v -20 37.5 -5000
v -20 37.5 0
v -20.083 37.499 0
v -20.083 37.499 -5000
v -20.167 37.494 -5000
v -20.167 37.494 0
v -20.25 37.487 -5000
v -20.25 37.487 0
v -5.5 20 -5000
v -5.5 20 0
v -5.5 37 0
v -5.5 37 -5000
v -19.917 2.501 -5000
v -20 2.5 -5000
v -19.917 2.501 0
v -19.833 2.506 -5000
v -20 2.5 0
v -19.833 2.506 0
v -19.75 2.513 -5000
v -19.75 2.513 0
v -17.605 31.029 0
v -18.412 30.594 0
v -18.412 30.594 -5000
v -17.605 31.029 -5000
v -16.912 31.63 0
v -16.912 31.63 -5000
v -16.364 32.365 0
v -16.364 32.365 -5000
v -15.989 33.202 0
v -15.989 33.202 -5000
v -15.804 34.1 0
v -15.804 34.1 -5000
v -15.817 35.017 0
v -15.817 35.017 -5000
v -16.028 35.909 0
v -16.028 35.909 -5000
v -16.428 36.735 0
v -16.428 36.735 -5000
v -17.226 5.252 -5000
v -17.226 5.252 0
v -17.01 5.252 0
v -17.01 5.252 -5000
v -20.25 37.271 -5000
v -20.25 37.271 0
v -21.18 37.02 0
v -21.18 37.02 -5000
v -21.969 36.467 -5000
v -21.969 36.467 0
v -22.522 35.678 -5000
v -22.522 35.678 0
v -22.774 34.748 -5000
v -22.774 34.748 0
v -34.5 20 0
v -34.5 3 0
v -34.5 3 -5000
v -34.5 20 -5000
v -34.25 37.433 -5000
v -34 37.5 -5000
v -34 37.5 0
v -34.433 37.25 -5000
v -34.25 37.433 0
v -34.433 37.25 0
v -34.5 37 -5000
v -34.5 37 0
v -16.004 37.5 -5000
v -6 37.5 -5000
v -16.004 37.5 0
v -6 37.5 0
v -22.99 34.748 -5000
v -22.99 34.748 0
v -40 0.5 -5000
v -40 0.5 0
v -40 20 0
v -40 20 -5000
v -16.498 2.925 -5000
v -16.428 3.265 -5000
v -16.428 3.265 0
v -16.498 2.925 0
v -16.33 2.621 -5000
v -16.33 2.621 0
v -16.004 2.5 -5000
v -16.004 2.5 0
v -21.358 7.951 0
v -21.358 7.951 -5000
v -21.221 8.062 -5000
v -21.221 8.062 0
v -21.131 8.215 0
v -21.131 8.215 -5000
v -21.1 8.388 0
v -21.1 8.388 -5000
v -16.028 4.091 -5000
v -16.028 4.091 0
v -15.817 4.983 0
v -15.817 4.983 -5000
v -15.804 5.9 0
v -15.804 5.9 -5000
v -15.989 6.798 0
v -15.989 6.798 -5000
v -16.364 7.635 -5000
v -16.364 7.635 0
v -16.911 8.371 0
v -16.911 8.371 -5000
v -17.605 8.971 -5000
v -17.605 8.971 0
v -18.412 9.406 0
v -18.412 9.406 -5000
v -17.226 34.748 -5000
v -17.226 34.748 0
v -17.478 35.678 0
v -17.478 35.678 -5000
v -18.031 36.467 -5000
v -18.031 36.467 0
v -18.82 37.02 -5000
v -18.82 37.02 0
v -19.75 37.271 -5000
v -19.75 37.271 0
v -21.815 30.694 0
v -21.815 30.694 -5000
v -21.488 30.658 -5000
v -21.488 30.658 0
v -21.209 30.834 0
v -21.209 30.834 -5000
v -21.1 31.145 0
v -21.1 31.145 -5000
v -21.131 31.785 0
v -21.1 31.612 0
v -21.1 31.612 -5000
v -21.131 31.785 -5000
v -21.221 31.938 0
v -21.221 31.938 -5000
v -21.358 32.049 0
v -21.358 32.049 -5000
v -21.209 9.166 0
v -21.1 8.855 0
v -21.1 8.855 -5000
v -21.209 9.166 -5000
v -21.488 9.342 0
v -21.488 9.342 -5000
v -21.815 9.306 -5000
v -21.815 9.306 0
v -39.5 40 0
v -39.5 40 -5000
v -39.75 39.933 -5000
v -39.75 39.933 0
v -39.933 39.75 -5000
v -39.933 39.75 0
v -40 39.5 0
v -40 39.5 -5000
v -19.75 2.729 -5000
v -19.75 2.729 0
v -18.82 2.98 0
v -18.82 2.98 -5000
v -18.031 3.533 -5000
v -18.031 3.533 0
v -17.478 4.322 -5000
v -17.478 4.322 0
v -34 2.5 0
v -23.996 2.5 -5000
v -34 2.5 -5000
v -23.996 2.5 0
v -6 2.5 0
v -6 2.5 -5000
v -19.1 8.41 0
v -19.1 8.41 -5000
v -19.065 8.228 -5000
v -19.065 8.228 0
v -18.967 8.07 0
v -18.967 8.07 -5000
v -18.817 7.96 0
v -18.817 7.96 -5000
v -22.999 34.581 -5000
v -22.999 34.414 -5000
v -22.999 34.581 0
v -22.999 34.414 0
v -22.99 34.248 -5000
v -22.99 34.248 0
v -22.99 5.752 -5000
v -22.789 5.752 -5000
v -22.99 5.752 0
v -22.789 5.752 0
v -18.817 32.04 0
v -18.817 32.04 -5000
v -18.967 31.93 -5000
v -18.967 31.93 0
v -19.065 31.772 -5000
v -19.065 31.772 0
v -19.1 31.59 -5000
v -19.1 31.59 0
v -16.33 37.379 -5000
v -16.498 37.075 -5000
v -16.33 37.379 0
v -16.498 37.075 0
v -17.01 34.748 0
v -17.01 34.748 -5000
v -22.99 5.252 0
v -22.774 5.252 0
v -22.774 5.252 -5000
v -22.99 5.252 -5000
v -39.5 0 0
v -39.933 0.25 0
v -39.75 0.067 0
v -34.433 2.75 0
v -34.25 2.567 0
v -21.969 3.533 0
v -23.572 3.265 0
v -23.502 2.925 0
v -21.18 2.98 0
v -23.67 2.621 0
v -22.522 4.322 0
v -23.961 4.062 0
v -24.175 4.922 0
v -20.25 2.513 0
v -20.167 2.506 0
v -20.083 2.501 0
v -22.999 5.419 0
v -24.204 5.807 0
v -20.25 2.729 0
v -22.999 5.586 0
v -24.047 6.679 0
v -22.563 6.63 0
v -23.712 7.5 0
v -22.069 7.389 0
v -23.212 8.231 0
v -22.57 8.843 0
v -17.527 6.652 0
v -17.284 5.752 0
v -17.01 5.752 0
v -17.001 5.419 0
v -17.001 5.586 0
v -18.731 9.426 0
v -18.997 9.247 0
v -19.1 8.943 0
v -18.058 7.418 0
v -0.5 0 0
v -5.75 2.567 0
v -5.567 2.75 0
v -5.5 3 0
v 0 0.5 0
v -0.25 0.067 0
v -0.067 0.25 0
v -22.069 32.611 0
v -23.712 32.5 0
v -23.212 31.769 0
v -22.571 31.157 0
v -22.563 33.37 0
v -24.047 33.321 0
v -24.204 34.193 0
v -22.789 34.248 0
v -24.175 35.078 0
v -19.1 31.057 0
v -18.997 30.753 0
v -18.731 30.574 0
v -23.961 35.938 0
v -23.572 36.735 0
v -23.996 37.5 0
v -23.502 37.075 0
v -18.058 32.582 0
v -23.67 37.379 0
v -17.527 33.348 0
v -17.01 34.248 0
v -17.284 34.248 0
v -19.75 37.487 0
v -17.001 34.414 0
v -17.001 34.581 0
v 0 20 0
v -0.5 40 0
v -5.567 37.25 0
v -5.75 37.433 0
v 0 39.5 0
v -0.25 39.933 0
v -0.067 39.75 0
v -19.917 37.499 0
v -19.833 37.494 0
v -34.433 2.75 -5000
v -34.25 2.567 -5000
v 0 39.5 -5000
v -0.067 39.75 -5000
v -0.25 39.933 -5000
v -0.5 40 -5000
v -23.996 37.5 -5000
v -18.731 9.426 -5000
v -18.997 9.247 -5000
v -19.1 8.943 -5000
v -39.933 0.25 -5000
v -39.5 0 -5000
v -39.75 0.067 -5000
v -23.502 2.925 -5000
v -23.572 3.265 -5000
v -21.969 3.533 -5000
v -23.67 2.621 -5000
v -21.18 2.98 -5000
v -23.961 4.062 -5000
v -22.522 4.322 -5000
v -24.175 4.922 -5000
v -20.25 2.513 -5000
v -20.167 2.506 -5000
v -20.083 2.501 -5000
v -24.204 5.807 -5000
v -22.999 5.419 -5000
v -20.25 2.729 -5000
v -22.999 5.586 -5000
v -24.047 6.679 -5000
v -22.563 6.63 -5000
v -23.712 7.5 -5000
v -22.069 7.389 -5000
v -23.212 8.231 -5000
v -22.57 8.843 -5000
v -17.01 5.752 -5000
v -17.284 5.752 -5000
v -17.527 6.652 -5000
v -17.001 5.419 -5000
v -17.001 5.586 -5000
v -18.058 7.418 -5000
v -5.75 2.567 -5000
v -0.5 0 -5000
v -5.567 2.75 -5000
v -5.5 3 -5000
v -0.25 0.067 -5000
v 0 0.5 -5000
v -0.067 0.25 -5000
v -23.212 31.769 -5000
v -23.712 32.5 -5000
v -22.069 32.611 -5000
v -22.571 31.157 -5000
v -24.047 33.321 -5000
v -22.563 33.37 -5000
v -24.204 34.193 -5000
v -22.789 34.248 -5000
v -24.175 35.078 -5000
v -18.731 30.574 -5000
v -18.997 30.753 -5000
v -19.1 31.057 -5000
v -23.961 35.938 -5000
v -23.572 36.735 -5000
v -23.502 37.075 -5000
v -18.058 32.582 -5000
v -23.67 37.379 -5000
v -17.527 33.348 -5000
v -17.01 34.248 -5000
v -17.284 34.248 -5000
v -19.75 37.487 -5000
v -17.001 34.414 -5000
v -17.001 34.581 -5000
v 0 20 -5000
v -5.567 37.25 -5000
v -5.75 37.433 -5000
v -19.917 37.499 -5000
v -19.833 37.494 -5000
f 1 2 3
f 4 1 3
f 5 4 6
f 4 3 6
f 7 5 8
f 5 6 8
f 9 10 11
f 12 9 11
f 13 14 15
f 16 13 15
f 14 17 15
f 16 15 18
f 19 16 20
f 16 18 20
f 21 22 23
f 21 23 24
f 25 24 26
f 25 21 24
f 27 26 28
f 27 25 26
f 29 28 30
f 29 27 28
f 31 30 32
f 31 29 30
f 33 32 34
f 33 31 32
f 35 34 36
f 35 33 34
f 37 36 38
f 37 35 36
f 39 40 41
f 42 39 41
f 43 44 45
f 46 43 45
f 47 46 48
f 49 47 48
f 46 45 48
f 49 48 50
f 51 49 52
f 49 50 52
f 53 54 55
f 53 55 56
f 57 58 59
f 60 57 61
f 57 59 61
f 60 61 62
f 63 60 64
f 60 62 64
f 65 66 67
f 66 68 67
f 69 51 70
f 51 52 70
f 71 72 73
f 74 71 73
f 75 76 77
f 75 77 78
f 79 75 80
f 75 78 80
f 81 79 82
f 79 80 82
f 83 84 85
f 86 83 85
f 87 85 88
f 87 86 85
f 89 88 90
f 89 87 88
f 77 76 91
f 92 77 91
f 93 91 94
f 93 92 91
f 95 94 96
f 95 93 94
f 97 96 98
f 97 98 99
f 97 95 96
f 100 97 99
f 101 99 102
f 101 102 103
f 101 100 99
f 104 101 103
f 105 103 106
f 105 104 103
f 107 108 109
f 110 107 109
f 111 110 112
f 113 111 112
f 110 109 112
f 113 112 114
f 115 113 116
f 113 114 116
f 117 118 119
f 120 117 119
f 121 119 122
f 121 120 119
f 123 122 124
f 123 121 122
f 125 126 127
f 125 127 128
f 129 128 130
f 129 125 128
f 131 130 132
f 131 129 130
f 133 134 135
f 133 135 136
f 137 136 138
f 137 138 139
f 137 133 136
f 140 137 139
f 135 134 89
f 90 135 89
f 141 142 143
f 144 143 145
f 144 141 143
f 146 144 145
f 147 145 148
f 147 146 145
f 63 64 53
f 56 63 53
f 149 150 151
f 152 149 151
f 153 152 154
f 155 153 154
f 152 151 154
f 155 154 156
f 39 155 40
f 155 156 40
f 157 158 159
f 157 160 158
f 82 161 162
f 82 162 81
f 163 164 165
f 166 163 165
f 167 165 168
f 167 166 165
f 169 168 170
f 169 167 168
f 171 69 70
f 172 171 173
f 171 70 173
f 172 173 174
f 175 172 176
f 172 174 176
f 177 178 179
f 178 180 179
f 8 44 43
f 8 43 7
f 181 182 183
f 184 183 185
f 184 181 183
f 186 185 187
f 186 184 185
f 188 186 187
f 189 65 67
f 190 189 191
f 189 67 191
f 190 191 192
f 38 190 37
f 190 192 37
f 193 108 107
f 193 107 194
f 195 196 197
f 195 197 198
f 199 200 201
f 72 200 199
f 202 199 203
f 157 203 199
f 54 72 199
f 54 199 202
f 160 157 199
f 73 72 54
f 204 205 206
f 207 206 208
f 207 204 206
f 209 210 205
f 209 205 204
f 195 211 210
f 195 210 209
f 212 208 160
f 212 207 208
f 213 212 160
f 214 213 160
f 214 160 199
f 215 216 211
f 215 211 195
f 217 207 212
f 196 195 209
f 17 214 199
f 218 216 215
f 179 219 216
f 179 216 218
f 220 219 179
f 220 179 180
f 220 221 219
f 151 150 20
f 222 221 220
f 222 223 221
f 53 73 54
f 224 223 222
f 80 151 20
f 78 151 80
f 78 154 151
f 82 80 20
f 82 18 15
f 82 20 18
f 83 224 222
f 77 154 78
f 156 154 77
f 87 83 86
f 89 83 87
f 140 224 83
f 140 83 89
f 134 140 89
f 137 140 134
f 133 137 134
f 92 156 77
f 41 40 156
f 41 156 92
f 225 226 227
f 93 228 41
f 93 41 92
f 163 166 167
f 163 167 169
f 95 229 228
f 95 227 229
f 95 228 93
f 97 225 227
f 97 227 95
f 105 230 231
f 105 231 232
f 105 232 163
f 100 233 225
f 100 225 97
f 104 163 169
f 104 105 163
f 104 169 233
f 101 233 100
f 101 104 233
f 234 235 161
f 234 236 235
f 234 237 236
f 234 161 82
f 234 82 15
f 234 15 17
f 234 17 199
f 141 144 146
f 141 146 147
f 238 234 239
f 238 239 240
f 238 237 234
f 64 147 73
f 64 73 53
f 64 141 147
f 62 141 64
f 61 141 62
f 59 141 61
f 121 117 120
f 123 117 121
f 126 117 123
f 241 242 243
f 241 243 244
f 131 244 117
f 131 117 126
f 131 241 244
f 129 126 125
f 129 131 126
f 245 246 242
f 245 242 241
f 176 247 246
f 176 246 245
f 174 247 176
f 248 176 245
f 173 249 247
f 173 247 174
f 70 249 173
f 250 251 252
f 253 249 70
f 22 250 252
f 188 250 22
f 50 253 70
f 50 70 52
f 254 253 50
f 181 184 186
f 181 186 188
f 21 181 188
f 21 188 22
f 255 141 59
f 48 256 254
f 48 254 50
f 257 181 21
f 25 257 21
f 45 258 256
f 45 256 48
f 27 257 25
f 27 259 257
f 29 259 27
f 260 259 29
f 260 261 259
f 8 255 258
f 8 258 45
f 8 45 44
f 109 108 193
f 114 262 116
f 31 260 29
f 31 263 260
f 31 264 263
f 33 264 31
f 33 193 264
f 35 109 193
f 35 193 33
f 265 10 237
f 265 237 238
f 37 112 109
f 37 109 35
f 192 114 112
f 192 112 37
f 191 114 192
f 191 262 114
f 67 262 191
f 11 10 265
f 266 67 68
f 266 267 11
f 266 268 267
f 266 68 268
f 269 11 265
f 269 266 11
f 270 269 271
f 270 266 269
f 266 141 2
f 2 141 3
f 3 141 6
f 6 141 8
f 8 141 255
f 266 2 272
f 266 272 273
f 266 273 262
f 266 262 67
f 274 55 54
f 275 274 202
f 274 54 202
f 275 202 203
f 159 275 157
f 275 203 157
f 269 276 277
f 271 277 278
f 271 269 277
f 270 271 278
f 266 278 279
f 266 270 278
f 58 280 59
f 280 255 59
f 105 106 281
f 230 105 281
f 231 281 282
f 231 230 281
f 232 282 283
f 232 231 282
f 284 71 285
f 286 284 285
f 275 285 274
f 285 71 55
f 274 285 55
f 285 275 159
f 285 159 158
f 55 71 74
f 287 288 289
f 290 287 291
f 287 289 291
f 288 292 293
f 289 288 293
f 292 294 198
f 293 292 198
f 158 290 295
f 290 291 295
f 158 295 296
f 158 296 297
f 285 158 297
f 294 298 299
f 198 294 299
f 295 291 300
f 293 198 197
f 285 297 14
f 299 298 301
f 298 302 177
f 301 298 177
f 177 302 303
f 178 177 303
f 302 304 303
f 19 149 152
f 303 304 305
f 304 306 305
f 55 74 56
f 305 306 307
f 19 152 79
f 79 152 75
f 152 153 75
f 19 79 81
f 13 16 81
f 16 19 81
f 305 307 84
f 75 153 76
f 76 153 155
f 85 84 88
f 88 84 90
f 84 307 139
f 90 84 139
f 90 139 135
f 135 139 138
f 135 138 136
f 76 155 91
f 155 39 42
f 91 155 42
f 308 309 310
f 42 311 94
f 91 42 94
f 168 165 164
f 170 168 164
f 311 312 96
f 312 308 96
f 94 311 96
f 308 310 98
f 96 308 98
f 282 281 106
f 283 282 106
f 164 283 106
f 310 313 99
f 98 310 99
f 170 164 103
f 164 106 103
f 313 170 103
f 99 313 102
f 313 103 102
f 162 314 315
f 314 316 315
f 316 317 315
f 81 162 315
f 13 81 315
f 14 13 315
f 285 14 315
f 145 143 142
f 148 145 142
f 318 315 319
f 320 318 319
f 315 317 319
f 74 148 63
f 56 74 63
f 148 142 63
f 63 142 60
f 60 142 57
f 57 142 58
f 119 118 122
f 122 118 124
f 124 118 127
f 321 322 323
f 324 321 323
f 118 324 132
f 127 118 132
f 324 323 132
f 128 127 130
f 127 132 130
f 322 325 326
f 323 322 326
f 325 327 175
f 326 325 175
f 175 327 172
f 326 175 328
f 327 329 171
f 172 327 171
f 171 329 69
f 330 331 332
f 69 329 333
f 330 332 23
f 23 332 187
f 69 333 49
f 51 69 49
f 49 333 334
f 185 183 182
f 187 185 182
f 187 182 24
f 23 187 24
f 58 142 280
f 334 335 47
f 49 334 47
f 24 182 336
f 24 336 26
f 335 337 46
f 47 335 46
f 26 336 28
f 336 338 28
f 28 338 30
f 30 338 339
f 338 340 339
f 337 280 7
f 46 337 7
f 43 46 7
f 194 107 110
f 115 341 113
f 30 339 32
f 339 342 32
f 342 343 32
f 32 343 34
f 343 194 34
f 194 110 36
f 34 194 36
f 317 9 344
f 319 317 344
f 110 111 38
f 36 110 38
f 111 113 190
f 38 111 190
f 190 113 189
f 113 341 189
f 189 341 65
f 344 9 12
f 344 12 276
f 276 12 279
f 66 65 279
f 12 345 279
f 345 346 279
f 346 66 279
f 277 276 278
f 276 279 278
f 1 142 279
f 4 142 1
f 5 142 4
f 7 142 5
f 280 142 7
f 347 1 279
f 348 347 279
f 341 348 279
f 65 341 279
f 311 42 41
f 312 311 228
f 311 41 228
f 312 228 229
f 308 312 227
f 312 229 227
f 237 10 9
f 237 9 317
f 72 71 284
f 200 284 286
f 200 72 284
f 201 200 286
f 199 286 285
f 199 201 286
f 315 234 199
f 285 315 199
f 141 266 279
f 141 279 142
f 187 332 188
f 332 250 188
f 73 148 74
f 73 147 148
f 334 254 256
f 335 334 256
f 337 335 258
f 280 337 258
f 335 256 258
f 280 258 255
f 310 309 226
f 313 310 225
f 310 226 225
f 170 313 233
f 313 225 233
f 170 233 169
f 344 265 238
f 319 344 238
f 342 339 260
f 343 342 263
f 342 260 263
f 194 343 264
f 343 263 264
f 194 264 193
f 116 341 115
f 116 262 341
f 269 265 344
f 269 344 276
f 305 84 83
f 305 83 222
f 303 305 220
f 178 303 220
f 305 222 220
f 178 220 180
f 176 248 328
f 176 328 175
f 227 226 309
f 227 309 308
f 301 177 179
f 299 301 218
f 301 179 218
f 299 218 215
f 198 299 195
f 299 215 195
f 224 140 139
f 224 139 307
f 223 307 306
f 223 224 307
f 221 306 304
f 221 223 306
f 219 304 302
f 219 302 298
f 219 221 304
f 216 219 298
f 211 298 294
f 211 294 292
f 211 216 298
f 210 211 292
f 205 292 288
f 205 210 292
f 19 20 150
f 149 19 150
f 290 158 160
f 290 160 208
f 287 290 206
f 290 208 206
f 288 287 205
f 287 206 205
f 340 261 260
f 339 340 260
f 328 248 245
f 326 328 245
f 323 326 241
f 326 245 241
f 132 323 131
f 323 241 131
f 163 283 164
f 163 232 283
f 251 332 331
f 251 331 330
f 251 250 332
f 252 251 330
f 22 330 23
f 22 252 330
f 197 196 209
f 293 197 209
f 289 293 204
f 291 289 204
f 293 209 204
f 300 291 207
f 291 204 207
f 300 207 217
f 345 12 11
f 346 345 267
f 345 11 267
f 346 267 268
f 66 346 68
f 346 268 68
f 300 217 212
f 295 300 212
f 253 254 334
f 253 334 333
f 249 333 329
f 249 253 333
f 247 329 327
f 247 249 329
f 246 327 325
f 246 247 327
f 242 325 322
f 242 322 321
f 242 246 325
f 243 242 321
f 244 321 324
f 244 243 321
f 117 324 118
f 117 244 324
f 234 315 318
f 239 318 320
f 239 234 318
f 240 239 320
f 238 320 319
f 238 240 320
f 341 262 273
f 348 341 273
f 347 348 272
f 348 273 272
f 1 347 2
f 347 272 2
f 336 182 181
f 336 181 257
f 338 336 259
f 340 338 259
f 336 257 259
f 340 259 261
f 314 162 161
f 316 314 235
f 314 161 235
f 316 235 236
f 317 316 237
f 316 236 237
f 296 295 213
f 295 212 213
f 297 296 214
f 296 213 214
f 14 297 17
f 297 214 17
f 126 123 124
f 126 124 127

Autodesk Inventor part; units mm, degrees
ref_plane "YZ Plane" through (0, 0, 0) normal (1, 0, 0) x (0, 1, 0)
ref_plane "XZ Plane" through (0, 0, 0) normal (0, 1, 0) x (-1, 0, 0)
ref_plane "XY Plane" through (0, 0, 0) normal (0, 0, 1) x (1, 0, 0)
sketch "Sketch1" plane through (0, 0, 0) normal (0, 0, 1) x (1, 0, 0)
  line L0 (0, 20) -> (0, 0.5)
  line L1 (-0.5, 0) -> (-39.5, 0)
  line L2 (-40, 0.5) -> (-40, 20)
  line L3 (-5.5, 20) -> (-5.5, 3)
  line L4 (-34.5, 3) -> (-34.5, 20)
  line L5 (3.5733, 20) -> (-48.8643, 20) construction
  line L6 (-19.1, 8.9433) -> (-19.1, 8.4104)
  line L7 (-21.1, 8.855) -> (-21.1, 8.3883)
  circle A0 centre (-20, 5.5022) radius 3 construction
  line L8 (-23.3299, 5.7522) -> (-16.6139, 5.7522) construction
  line L9 (-16.6139, 5.7522) -> (-16.6139, 5.2522) construction
  line L10 (-16.6139, 5.2522) -> (-23.3299, 5.2522) construction
  line L11 (-23.3299, 5.2522) -> (-23.3299, 5.7522) construction
  line L12 (-22.7888, 5.7522) -> (-22.9896, 5.7522)
  line L13 (-22.7735, 5.2522) -> (-22.9896, 5.2522)
  arc A1 (-22.9896, 5.7522) -> (-22.9896, 5.2522) centre (-20, 5.5022) ccw
  line L14 (-17.2838, 5.7522) -> (-17.0104, 5.7522)
  line L15 (-17.2265, 5.2522) -> (-17.0104, 5.2522)
  arc A2 (-17.0104, 5.2522) -> (-17.0104, 5.7522) centre (-20, 5.5022) ccw
  arc A3 (-17.2838, 5.7522) -> (-18.8169, 7.9599) centre (-20, 5.5022) ccw
  arc A4 (-21.3576, 7.951) -> (-22.7888, 5.7522) centre (-20, 5.5022) ccw
  arc A5 (-22.7735, 5.2522) -> (-17.2265, 5.2522) centre (-20, 5.5022) ccw
  line L16 (-20.25, 6.2494) -> (-19.75, 6.2494) construction
  line L17 (-19.75, 6.2494) -> (-19.75, 2.1596) construction
  line L18 (-19.75, 2.1596) -> (-20.25, 2.1596) construction
  line L19 (-20.25, 2.1596) -> (-20.25, 6.2494) construction
  line L20 (-20.25, 2.7287) -> (-20.25, 2.5126)
  line L21 (-19.75, 2.5126) -> (-19.75, 2.7287)
  arc A6 (-20.25, 2.5126) -> (-19.75, 2.5126) centre (-20, 4.9859) ccw
  arc A7 (-21.8153, 9.3062) -> (-23.5725, 3.2653) centre (-20, 5.5022) ccw
  arc A8 (-16.4275, 3.2653) -> (-18.4116, 9.4064) centre (-20, 5.5022) ccw
  line L22 (-6, 2.5) -> (-16.0037, 2.5)
  line L23 (-19.75, 2.5) -> (-20.25, 2.5)
  line L24 (-23.9963, 2.5) -> (-34, 2.5)
  circle A9 centre (-20, 5.5022) radius 4.215 construction
  arc A10 (-34.5, 3) -> (-34, 2.5) centre (-34, 3) ccw
  arc A11 (-40, 0.5) -> (-39.5, 0) centre (-39.5, 0.5) ccw
  arc A12 (-23.9963, 2.5) -> (-23.5725, 3.2653) centre (-23.9963, 3) ccw
  arc A13 (-21.1, 8.855) -> (-21.8153, 9.3062) centre (-21.6, 8.855) ccw
  arc A14 (-21.3576, 7.951) -> (-21.1, 8.3883) centre (-21.6, 8.3883) ccw
  arc A15 (-19.1, 8.4104) -> (-18.8169, 7.9599) centre (-18.6, 8.4104) ccw
  arc A16 (-18.4116, 9.4064) -> (-19.1, 8.9433) centre (-18.6, 8.9433) ccw
  arc A17 (-16.4275, 3.2653) -> (-16.0037, 2.5) centre (-16.0037, 3) ccw
  arc A18 (-6, 2.5) -> (-5.5, 3) centre (-6, 3) ccw
  arc A19 (-0.5, 0) -> (0, 0.5) centre (-0.5, 0.5) ccw
  line L25 (0, 20) -> (0, 39.5)
  line L26 (-0.5, 40) -> (-39.5, 40)
  line L27 (-40, 39.5) -> (-40, 20)
  line L28 (-5.5, 20) -> (-5.5, 37)
  line L29 (-34.5, 37) -> (-34.5, 20)
  line L30 (-19.1, 31.0567) -> (-19.1, 31.5896)
  line L31 (-21.1, 31.145) -> (-21.1, 31.6117)
  circle A20 centre (-20, 34.4978) radius 3 construction
  line L32 (-23.3299, 34.2478) -> (-16.6139, 34.2478) construction
  line L33 (-16.6139, 34.2478) -> (-16.6139, 34.7478) construction
  line L34 (-16.6139, 34.7478) -> (-23.3299, 34.7478) construction
  line L35 (-23.3299, 34.7478) -> (-23.3299, 34.2478) construction
  line L36 (-22.7888, 34.2478) -> (-22.9896, 34.2478)
  line L37 (-22.7735, 34.7478) -> (-22.9896, 34.7478)
  arc A21 (-22.9896, 34.7478) -> (-22.9896, 34.2478) centre (-20, 34.4978) ccw
  line L38 (-17.2838, 34.2478) -> (-17.0104, 34.2478)
  line L39 (-17.2265, 34.7478) -> (-17.0104, 34.7478)
  arc A22 (-17.0104, 34.2478) -> (-17.0104, 34.7478) centre (-20, 34.4978) ccw
  arc A23 (-18.8169, 32.0401) -> (-17.2838, 34.2478) centre (-20, 34.4978) ccw
  arc A24 (-22.7888, 34.2478) -> (-21.3576, 32.049) centre (-20, 34.4978) ccw
  arc A25 (-17.2265, 34.7478) -> (-22.7735, 34.7478) centre (-20, 34.4978) ccw
  line L40 (-20.25, 33.7506) -> (-19.75, 33.7506) construction
  line L41 (-19.75, 33.7506) -> (-19.75, 37.8404) construction
  line L42 (-19.75, 37.8404) -> (-20.25, 37.8404) construction
  line L43 (-20.25, 37.8404) -> (-20.25, 33.7506) construction
  line L44 (-20.25, 37.2713) -> (-20.25, 37.4874)
  line L45 (-19.75, 37.4874) -> (-19.75, 37.2713)
  arc A26 (-19.75, 37.4874) -> (-20.25, 37.4874) centre (-20, 35.0141) ccw
  arc A27 (-23.5725, 36.7347) -> (-21.8153, 30.6938) centre (-20, 34.4978) ccw
  arc A28 (-18.4116, 30.5936) -> (-16.4275, 36.7347) centre (-20, 34.4978) ccw
  line L46 (-6, 37.5) -> (-16.0037, 37.5)
  line L47 (-19.75, 37.5) -> (-20.25, 37.5)
  line L48 (-23.9963, 37.5) -> (-34, 37.5)
  circle A29 centre (-20, 34.4978) radius 4.215 construction
  arc A30 (-34, 37.5) -> (-34.5, 37) centre (-34, 37) ccw
  arc A31 (-39.5, 40) -> (-40, 39.5) centre (-39.5, 39.5) ccw
  arc A32 (-23.5725, 36.7347) -> (-23.9963, 37.5) centre (-23.9963, 37) ccw
  arc A33 (-21.8153, 30.6938) -> (-21.1, 31.145) centre (-21.6, 31.145) ccw
  arc A34 (-21.1, 31.6117) -> (-21.3576, 32.049) centre (-21.6, 31.6117) ccw
  arc A35 (-18.8169, 32.0401) -> (-19.1, 31.5896) centre (-18.6, 31.5896) ccw
  arc A36 (-19.1, 31.0567) -> (-18.4116, 30.5936) centre (-18.6, 31.0567) ccw
  arc A37 (-16.0037, 37.5) -> (-16.4275, 36.7347) centre (-16.0037, 37) ccw
  arc A38 (-5.5, 37) -> (-6, 37.5) centre (-6, 37) ccw
  arc A39 (0, 39.5) -> (-0.5, 40) centre (-0.5, 39.5) ccw
  point P0 (0, 0)
  point P1 (0, 0)
  point P2 (-40, 0)
  point P3 (-19.1, 9.62)
  point P4 (-19.1, 8.077)
  point P5 (-21.1, 9.5711)
  point P6 (-21.1, 8.077)
  point P7 (-22.9586, 2.5)
  point P8 (-17.0414, 2.5)
  point P9 (-17.1471, 5.7522)
  point P10 (-17.1185, 5.2522)
  point P11 (0, 40)
  point P12 (-40, 40)
  point P13 (-19.1, 30.38)
  point P14 (-19.1, 31.923)
  point P15 (-21.1, 30.4289)
  point P16 (-21.1, 31.923)
  point P17 (-22.9586, 37.5)
  point P18 (-17.0414, 37.5)
  point P19 (-17.1471, 34.2478)
  point P20 (-17.1185, 34.7478)
  dimension "d2" = 5.5
  dimension "d3" = 5.5
  dimension "d5" = 40
  dimension "d6" = 20
  dimension "d12" = 6
  dimension "d14" = 0.25
  dimension "d16" = 0.25
  dimension "d18" = 20
  dimension "d19" = 8.43
  dimension "d20" = 0.5
  dimension "d21" = 2
  dimension "d23" = 0.5
  dimension "d24" = 2.5
extrude "Extrusion1" add sketch "Sketch1" against normal blind 5000
properties part number "HD - 405 PERFIL ALUMINIO - COLUMNA"
